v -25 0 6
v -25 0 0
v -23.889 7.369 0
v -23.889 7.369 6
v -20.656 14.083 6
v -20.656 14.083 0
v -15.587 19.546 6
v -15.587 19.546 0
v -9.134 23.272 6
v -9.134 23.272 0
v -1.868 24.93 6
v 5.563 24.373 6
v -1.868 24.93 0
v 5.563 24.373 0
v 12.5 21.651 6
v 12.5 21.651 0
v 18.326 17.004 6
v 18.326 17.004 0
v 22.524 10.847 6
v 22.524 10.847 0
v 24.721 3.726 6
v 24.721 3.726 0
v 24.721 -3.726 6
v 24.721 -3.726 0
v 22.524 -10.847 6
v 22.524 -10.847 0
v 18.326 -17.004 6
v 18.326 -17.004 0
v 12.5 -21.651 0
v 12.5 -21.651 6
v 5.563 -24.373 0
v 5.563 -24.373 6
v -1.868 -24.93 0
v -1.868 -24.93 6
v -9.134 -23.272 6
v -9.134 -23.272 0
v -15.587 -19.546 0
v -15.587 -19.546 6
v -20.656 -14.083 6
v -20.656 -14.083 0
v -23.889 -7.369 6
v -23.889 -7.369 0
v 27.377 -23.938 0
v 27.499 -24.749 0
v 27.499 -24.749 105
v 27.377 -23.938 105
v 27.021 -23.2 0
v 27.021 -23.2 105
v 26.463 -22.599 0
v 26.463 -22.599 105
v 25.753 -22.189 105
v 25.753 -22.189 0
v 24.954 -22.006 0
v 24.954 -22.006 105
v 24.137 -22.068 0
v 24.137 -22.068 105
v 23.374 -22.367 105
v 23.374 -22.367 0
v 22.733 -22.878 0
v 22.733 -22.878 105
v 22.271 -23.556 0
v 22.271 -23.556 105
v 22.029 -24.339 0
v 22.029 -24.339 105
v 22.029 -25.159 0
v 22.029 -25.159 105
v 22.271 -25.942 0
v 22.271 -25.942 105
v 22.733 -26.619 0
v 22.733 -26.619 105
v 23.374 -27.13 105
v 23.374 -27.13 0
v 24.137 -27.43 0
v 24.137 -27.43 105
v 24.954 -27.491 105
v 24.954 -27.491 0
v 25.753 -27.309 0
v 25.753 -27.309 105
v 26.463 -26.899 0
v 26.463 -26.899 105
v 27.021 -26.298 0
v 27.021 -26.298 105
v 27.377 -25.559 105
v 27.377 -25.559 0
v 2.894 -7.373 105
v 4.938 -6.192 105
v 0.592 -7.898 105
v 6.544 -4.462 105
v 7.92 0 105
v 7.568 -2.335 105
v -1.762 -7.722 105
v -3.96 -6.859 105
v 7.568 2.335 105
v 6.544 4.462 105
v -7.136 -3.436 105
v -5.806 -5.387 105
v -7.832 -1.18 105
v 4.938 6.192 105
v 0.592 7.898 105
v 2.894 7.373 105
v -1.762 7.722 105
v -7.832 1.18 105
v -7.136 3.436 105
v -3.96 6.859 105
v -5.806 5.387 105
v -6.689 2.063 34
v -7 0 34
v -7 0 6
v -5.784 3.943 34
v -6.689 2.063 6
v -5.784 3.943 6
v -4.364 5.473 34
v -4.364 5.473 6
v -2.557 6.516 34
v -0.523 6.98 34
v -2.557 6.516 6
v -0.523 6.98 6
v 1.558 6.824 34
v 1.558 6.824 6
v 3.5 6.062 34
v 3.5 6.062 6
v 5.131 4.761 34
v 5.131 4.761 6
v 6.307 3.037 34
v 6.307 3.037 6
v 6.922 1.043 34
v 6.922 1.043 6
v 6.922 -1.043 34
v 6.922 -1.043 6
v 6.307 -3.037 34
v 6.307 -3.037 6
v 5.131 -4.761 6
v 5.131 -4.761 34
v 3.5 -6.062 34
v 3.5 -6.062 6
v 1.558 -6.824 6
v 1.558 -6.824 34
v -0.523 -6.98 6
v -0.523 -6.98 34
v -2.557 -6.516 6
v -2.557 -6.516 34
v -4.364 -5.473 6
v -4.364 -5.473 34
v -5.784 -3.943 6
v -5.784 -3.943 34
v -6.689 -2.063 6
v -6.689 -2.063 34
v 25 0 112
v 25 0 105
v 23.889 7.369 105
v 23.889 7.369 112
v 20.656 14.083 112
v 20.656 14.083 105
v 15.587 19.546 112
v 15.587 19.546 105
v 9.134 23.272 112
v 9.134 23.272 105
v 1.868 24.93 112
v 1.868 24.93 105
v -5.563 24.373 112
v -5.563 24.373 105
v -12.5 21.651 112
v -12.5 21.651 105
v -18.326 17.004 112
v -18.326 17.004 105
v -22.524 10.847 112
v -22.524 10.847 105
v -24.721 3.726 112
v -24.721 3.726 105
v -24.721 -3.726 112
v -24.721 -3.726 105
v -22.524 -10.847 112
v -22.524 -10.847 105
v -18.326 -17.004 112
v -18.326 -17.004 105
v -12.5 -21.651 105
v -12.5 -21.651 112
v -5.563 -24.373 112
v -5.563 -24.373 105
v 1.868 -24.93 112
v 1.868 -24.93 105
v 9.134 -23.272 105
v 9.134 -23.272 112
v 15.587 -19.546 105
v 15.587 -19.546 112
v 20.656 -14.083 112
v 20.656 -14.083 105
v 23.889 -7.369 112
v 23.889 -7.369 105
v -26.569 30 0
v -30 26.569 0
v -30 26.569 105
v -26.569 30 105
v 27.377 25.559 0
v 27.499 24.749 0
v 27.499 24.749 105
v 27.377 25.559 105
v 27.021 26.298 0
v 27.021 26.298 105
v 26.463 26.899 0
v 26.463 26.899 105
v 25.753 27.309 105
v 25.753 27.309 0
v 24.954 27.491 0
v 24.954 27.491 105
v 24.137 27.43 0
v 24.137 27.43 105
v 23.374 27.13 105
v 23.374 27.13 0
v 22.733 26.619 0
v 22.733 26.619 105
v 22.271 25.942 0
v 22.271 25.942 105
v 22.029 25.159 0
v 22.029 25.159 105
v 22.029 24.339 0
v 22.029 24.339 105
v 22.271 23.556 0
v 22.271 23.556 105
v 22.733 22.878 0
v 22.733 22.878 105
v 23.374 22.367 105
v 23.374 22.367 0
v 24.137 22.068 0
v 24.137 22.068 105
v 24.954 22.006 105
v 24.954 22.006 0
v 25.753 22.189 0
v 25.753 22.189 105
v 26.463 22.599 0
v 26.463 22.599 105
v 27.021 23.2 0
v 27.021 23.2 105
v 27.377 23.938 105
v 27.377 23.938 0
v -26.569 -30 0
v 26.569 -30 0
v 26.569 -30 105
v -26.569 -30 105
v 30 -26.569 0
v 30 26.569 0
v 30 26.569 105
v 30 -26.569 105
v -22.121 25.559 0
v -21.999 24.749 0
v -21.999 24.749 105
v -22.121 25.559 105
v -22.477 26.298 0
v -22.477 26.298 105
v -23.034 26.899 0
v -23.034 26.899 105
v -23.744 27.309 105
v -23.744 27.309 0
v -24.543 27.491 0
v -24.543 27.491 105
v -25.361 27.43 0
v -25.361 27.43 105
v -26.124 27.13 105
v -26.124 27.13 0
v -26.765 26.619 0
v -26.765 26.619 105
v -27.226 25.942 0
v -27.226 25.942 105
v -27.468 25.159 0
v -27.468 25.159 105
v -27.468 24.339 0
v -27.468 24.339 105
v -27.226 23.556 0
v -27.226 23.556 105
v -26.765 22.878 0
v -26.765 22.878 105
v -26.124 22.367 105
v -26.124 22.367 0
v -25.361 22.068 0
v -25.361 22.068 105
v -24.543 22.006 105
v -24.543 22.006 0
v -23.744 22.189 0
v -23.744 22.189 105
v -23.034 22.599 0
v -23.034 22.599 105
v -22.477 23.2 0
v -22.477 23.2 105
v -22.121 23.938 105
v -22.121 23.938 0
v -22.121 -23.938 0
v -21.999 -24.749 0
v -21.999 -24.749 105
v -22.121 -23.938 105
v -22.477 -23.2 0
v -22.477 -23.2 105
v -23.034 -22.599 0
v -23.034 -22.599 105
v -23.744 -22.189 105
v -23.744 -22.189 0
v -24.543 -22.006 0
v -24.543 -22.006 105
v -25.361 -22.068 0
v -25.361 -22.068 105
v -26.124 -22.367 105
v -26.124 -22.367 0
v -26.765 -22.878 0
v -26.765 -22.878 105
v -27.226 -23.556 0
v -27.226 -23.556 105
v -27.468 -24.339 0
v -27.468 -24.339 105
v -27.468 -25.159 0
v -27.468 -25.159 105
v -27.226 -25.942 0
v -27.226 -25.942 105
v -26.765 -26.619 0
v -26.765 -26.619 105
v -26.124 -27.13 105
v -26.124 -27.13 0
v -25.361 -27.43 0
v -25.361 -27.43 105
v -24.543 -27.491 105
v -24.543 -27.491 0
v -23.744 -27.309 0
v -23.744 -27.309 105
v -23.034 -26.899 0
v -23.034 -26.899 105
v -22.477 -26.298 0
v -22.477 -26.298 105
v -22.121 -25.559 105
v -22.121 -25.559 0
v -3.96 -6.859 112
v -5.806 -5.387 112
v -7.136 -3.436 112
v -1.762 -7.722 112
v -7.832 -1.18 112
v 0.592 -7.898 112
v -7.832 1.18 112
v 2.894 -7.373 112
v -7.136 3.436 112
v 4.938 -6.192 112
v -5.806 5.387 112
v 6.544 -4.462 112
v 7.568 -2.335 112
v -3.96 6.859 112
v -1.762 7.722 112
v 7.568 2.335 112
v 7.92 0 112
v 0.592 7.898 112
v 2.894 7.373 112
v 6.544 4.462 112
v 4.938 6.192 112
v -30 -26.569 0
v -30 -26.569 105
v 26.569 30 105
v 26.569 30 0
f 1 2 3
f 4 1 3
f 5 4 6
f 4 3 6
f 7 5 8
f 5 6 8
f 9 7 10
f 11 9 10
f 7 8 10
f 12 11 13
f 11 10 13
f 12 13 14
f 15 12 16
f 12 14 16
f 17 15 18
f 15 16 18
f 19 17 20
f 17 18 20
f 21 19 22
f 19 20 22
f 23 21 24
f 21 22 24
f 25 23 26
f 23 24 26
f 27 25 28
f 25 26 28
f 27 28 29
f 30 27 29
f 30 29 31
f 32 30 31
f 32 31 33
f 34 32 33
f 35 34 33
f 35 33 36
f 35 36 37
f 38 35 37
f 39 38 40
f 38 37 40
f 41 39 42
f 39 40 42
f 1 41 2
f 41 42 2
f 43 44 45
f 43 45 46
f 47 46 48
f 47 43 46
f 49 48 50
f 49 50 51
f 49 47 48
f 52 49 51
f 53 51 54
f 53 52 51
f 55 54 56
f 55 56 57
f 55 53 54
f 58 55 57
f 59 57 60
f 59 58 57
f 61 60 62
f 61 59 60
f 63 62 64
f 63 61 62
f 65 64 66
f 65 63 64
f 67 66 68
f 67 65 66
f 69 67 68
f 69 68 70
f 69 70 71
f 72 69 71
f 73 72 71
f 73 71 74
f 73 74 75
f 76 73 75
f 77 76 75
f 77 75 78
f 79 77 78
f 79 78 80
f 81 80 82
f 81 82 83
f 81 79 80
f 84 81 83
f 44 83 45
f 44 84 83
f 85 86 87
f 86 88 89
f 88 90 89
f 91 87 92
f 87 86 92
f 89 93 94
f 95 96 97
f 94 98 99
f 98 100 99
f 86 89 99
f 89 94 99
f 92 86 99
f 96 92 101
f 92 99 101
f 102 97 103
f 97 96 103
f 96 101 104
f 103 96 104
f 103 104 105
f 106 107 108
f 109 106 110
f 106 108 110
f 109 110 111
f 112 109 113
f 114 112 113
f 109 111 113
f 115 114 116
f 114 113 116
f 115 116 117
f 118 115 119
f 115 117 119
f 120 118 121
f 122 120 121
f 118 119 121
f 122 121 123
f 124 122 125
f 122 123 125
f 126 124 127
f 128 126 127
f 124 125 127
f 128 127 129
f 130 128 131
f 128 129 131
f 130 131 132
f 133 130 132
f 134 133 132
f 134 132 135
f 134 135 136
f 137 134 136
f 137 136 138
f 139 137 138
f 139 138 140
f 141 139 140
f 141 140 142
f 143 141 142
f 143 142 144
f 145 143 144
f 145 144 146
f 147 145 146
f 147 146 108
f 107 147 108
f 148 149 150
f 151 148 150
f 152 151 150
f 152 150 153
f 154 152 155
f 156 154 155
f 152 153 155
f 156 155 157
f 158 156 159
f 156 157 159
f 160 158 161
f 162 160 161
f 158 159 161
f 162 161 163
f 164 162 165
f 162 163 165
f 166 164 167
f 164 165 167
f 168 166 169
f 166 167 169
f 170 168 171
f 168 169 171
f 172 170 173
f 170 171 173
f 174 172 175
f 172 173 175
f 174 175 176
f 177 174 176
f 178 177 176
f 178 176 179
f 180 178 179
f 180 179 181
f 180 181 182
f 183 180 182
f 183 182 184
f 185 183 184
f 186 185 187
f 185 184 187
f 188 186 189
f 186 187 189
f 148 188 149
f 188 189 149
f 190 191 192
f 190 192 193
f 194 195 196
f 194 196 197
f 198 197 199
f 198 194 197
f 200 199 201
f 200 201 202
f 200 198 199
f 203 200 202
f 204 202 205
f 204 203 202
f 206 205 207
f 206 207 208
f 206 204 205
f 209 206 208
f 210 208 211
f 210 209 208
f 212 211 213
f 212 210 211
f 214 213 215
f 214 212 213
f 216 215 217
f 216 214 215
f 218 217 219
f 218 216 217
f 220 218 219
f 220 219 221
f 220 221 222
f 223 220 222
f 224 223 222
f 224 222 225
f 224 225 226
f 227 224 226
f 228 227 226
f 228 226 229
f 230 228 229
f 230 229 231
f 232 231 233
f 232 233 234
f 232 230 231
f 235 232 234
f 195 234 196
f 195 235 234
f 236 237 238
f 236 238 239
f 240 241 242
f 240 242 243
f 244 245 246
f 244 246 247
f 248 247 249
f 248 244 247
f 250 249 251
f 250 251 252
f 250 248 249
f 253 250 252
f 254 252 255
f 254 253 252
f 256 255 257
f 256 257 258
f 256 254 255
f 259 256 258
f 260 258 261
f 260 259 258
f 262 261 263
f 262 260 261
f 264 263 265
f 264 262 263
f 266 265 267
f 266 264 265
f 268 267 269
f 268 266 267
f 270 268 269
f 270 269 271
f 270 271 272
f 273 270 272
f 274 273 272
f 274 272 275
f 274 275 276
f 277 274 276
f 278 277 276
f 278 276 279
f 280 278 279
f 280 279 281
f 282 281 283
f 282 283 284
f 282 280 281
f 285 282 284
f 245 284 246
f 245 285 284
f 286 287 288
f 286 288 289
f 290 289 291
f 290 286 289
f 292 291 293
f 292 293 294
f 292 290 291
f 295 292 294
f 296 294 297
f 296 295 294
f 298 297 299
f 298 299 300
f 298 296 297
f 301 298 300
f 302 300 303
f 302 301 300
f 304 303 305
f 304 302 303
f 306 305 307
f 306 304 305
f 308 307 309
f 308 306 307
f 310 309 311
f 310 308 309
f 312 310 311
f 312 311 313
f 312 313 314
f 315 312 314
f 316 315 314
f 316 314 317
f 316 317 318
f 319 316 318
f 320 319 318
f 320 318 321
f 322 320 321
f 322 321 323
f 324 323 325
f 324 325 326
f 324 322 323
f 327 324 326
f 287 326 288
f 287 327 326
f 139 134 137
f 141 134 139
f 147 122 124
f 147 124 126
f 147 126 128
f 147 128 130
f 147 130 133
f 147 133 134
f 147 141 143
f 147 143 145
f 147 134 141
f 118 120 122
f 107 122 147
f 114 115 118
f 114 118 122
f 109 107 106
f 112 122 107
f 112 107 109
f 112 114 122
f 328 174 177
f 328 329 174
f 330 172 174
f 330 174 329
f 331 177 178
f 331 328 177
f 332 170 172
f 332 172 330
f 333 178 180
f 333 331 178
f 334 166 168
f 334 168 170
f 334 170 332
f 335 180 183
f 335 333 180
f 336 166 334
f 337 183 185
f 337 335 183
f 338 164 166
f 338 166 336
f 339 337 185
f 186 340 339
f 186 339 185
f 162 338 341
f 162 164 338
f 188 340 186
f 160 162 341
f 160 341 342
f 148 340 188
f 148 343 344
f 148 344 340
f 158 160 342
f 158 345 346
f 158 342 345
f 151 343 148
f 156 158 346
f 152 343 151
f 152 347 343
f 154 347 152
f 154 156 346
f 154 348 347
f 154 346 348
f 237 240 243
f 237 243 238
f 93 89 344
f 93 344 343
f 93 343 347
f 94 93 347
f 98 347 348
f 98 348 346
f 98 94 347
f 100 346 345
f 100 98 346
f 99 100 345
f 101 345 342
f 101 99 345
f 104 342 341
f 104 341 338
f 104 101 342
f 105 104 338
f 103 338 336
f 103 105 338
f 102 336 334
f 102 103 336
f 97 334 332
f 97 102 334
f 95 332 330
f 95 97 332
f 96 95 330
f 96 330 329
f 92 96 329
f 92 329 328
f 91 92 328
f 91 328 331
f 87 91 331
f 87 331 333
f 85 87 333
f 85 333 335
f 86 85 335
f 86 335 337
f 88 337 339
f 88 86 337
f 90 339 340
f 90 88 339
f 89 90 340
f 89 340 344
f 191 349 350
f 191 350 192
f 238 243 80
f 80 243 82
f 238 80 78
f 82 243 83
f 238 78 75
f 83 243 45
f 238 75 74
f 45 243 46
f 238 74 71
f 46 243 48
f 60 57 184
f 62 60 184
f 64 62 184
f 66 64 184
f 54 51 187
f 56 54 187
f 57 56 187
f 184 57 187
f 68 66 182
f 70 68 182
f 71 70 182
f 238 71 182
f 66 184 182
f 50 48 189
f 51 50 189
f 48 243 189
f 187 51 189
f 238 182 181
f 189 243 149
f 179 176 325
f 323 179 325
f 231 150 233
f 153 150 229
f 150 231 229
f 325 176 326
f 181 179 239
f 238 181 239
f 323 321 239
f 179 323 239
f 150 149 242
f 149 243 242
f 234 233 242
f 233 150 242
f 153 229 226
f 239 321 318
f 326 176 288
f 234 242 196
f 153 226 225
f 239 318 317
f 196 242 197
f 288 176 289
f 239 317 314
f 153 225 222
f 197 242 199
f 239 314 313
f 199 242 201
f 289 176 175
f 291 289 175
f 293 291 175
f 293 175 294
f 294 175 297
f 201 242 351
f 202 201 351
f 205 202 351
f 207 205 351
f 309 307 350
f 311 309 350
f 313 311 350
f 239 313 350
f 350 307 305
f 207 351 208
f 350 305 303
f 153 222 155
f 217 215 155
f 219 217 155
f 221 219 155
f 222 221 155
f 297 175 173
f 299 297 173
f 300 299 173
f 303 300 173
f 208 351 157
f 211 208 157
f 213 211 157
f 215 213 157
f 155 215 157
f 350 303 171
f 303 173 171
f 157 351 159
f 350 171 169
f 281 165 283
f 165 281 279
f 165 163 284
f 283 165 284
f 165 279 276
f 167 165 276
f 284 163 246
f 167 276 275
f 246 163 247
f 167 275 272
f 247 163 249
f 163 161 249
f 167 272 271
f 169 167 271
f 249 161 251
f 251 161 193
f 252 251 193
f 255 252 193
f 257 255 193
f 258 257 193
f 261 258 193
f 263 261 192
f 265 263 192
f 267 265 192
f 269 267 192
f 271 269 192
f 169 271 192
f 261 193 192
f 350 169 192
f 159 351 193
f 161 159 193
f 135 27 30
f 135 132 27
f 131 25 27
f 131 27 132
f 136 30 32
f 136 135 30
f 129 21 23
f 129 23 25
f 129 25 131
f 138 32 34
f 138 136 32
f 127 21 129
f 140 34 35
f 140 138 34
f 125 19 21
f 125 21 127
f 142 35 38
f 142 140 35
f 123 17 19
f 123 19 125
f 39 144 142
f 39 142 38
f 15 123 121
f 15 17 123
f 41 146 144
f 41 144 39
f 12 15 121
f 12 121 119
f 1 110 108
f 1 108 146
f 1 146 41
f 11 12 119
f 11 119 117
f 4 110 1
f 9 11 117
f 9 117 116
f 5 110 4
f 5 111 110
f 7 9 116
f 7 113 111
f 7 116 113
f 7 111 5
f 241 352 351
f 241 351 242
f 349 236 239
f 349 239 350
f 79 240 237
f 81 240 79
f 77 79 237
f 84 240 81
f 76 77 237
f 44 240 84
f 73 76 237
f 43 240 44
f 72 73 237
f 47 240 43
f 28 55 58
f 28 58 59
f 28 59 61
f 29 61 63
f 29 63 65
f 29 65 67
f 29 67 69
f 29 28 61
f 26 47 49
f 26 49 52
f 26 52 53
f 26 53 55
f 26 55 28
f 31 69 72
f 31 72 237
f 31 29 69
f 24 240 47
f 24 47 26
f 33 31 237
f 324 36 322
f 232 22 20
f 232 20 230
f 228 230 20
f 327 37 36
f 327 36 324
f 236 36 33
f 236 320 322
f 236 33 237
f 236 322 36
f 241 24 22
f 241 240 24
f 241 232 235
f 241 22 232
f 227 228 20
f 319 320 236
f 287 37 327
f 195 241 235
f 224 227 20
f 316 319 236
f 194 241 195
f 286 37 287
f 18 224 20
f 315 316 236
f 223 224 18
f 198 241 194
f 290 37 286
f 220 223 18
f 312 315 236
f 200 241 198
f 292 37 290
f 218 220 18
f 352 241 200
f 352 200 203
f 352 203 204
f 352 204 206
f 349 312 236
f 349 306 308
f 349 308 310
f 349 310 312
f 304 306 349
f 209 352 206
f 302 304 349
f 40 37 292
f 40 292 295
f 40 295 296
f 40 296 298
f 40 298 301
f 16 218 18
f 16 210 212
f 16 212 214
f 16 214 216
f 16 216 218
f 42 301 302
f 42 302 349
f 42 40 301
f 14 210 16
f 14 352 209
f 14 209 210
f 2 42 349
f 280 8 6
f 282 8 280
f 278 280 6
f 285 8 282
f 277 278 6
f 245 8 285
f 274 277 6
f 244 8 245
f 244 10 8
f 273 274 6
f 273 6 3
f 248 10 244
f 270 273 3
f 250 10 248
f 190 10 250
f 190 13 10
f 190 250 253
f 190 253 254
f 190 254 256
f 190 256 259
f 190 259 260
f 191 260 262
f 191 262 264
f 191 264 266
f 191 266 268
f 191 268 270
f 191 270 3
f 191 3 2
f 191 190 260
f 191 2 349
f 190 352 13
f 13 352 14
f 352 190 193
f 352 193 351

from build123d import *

# Parameters (mm, degrees)
SKETCH1_R           = 2.75
BOSS_EXTRUDE1_DEPTH = 105
SKETCH2_R           = 25
SKETCH2_R_2         = 7.920218335
BOSS_EXTRUDE2_DEPTH = 7
SKETCH3_R           = 25
SKETCH3_R_2         = 7
CUT_EXTRUDE1_DEPTH  = 6
SKETCH3_2_R         = 7
CUT_EXTRUDE2_DEPTH  = 34


with BuildPart() as part:
    # Sketch1 → Boss-Extrude1 (new body)
    with BuildSketch(Plane.XY):
        Polygon((-30, 26.568542495), (-30, -26.568542495), (-26.568542495, -30), (26.568542495, -30), (30, -26.568542495), (30, 26.568542495), (26.568542495, 30), (-26.568542495, 30), align=None)
        with Locations((-24.748737342, -24.748737342)):
            Circle(SKETCH1_R, mode=Mode.SUBTRACT)
        with Locations((24.748737342, -24.748737342)):
            Circle(SKETCH1_R, mode=Mode.SUBTRACT)
        with Locations((-24.748737342, 24.748737342)):
            Circle(SKETCH1_R, mode=Mode.SUBTRACT)
        with Locations((24.748737342, 24.748737342)):
            Circle(SKETCH1_R, mode=Mode.SUBTRACT)
    extrude(amount=BOSS_EXTRUDE1_DEPTH)

    # Sketch2 → Boss-Extrude2 (add)
    with BuildSketch(Plane.XY.offset(105)):
        Circle(SKETCH2_R)
        Circle(SKETCH2_R_2, mode=Mode.SUBTRACT)
    extrude(amount=BOSS_EXTRUDE2_DEPTH)

    # Sketch3 → Cut-Extrude1 (cut)
    with BuildSketch(Plane(origin=(0, 0, 0), x_dir=(-1, 0, 0), z_dir=(0, 0, -1))):
        Circle(SKETCH3_R)
        Circle(SKETCH3_R_2, mode=Mode.SUBTRACT)
    extrude(amount=-CUT_EXTRUDE1_DEPTH, mode=Mode.SUBTRACT)

    # Sketch3<2> → Cut-Extrude2 (cut)
    with BuildSketch(Plane(origin=(0, 0, 0), x_dir=(-1, 0, 0), z_dir=(0, 0, -1))):
        Circle(SKETCH3_2_R)
    extrude(amount=-CUT_EXTRUDE2_DEPTH, mode=Mode.SUBTRACT)


solid = part.part
